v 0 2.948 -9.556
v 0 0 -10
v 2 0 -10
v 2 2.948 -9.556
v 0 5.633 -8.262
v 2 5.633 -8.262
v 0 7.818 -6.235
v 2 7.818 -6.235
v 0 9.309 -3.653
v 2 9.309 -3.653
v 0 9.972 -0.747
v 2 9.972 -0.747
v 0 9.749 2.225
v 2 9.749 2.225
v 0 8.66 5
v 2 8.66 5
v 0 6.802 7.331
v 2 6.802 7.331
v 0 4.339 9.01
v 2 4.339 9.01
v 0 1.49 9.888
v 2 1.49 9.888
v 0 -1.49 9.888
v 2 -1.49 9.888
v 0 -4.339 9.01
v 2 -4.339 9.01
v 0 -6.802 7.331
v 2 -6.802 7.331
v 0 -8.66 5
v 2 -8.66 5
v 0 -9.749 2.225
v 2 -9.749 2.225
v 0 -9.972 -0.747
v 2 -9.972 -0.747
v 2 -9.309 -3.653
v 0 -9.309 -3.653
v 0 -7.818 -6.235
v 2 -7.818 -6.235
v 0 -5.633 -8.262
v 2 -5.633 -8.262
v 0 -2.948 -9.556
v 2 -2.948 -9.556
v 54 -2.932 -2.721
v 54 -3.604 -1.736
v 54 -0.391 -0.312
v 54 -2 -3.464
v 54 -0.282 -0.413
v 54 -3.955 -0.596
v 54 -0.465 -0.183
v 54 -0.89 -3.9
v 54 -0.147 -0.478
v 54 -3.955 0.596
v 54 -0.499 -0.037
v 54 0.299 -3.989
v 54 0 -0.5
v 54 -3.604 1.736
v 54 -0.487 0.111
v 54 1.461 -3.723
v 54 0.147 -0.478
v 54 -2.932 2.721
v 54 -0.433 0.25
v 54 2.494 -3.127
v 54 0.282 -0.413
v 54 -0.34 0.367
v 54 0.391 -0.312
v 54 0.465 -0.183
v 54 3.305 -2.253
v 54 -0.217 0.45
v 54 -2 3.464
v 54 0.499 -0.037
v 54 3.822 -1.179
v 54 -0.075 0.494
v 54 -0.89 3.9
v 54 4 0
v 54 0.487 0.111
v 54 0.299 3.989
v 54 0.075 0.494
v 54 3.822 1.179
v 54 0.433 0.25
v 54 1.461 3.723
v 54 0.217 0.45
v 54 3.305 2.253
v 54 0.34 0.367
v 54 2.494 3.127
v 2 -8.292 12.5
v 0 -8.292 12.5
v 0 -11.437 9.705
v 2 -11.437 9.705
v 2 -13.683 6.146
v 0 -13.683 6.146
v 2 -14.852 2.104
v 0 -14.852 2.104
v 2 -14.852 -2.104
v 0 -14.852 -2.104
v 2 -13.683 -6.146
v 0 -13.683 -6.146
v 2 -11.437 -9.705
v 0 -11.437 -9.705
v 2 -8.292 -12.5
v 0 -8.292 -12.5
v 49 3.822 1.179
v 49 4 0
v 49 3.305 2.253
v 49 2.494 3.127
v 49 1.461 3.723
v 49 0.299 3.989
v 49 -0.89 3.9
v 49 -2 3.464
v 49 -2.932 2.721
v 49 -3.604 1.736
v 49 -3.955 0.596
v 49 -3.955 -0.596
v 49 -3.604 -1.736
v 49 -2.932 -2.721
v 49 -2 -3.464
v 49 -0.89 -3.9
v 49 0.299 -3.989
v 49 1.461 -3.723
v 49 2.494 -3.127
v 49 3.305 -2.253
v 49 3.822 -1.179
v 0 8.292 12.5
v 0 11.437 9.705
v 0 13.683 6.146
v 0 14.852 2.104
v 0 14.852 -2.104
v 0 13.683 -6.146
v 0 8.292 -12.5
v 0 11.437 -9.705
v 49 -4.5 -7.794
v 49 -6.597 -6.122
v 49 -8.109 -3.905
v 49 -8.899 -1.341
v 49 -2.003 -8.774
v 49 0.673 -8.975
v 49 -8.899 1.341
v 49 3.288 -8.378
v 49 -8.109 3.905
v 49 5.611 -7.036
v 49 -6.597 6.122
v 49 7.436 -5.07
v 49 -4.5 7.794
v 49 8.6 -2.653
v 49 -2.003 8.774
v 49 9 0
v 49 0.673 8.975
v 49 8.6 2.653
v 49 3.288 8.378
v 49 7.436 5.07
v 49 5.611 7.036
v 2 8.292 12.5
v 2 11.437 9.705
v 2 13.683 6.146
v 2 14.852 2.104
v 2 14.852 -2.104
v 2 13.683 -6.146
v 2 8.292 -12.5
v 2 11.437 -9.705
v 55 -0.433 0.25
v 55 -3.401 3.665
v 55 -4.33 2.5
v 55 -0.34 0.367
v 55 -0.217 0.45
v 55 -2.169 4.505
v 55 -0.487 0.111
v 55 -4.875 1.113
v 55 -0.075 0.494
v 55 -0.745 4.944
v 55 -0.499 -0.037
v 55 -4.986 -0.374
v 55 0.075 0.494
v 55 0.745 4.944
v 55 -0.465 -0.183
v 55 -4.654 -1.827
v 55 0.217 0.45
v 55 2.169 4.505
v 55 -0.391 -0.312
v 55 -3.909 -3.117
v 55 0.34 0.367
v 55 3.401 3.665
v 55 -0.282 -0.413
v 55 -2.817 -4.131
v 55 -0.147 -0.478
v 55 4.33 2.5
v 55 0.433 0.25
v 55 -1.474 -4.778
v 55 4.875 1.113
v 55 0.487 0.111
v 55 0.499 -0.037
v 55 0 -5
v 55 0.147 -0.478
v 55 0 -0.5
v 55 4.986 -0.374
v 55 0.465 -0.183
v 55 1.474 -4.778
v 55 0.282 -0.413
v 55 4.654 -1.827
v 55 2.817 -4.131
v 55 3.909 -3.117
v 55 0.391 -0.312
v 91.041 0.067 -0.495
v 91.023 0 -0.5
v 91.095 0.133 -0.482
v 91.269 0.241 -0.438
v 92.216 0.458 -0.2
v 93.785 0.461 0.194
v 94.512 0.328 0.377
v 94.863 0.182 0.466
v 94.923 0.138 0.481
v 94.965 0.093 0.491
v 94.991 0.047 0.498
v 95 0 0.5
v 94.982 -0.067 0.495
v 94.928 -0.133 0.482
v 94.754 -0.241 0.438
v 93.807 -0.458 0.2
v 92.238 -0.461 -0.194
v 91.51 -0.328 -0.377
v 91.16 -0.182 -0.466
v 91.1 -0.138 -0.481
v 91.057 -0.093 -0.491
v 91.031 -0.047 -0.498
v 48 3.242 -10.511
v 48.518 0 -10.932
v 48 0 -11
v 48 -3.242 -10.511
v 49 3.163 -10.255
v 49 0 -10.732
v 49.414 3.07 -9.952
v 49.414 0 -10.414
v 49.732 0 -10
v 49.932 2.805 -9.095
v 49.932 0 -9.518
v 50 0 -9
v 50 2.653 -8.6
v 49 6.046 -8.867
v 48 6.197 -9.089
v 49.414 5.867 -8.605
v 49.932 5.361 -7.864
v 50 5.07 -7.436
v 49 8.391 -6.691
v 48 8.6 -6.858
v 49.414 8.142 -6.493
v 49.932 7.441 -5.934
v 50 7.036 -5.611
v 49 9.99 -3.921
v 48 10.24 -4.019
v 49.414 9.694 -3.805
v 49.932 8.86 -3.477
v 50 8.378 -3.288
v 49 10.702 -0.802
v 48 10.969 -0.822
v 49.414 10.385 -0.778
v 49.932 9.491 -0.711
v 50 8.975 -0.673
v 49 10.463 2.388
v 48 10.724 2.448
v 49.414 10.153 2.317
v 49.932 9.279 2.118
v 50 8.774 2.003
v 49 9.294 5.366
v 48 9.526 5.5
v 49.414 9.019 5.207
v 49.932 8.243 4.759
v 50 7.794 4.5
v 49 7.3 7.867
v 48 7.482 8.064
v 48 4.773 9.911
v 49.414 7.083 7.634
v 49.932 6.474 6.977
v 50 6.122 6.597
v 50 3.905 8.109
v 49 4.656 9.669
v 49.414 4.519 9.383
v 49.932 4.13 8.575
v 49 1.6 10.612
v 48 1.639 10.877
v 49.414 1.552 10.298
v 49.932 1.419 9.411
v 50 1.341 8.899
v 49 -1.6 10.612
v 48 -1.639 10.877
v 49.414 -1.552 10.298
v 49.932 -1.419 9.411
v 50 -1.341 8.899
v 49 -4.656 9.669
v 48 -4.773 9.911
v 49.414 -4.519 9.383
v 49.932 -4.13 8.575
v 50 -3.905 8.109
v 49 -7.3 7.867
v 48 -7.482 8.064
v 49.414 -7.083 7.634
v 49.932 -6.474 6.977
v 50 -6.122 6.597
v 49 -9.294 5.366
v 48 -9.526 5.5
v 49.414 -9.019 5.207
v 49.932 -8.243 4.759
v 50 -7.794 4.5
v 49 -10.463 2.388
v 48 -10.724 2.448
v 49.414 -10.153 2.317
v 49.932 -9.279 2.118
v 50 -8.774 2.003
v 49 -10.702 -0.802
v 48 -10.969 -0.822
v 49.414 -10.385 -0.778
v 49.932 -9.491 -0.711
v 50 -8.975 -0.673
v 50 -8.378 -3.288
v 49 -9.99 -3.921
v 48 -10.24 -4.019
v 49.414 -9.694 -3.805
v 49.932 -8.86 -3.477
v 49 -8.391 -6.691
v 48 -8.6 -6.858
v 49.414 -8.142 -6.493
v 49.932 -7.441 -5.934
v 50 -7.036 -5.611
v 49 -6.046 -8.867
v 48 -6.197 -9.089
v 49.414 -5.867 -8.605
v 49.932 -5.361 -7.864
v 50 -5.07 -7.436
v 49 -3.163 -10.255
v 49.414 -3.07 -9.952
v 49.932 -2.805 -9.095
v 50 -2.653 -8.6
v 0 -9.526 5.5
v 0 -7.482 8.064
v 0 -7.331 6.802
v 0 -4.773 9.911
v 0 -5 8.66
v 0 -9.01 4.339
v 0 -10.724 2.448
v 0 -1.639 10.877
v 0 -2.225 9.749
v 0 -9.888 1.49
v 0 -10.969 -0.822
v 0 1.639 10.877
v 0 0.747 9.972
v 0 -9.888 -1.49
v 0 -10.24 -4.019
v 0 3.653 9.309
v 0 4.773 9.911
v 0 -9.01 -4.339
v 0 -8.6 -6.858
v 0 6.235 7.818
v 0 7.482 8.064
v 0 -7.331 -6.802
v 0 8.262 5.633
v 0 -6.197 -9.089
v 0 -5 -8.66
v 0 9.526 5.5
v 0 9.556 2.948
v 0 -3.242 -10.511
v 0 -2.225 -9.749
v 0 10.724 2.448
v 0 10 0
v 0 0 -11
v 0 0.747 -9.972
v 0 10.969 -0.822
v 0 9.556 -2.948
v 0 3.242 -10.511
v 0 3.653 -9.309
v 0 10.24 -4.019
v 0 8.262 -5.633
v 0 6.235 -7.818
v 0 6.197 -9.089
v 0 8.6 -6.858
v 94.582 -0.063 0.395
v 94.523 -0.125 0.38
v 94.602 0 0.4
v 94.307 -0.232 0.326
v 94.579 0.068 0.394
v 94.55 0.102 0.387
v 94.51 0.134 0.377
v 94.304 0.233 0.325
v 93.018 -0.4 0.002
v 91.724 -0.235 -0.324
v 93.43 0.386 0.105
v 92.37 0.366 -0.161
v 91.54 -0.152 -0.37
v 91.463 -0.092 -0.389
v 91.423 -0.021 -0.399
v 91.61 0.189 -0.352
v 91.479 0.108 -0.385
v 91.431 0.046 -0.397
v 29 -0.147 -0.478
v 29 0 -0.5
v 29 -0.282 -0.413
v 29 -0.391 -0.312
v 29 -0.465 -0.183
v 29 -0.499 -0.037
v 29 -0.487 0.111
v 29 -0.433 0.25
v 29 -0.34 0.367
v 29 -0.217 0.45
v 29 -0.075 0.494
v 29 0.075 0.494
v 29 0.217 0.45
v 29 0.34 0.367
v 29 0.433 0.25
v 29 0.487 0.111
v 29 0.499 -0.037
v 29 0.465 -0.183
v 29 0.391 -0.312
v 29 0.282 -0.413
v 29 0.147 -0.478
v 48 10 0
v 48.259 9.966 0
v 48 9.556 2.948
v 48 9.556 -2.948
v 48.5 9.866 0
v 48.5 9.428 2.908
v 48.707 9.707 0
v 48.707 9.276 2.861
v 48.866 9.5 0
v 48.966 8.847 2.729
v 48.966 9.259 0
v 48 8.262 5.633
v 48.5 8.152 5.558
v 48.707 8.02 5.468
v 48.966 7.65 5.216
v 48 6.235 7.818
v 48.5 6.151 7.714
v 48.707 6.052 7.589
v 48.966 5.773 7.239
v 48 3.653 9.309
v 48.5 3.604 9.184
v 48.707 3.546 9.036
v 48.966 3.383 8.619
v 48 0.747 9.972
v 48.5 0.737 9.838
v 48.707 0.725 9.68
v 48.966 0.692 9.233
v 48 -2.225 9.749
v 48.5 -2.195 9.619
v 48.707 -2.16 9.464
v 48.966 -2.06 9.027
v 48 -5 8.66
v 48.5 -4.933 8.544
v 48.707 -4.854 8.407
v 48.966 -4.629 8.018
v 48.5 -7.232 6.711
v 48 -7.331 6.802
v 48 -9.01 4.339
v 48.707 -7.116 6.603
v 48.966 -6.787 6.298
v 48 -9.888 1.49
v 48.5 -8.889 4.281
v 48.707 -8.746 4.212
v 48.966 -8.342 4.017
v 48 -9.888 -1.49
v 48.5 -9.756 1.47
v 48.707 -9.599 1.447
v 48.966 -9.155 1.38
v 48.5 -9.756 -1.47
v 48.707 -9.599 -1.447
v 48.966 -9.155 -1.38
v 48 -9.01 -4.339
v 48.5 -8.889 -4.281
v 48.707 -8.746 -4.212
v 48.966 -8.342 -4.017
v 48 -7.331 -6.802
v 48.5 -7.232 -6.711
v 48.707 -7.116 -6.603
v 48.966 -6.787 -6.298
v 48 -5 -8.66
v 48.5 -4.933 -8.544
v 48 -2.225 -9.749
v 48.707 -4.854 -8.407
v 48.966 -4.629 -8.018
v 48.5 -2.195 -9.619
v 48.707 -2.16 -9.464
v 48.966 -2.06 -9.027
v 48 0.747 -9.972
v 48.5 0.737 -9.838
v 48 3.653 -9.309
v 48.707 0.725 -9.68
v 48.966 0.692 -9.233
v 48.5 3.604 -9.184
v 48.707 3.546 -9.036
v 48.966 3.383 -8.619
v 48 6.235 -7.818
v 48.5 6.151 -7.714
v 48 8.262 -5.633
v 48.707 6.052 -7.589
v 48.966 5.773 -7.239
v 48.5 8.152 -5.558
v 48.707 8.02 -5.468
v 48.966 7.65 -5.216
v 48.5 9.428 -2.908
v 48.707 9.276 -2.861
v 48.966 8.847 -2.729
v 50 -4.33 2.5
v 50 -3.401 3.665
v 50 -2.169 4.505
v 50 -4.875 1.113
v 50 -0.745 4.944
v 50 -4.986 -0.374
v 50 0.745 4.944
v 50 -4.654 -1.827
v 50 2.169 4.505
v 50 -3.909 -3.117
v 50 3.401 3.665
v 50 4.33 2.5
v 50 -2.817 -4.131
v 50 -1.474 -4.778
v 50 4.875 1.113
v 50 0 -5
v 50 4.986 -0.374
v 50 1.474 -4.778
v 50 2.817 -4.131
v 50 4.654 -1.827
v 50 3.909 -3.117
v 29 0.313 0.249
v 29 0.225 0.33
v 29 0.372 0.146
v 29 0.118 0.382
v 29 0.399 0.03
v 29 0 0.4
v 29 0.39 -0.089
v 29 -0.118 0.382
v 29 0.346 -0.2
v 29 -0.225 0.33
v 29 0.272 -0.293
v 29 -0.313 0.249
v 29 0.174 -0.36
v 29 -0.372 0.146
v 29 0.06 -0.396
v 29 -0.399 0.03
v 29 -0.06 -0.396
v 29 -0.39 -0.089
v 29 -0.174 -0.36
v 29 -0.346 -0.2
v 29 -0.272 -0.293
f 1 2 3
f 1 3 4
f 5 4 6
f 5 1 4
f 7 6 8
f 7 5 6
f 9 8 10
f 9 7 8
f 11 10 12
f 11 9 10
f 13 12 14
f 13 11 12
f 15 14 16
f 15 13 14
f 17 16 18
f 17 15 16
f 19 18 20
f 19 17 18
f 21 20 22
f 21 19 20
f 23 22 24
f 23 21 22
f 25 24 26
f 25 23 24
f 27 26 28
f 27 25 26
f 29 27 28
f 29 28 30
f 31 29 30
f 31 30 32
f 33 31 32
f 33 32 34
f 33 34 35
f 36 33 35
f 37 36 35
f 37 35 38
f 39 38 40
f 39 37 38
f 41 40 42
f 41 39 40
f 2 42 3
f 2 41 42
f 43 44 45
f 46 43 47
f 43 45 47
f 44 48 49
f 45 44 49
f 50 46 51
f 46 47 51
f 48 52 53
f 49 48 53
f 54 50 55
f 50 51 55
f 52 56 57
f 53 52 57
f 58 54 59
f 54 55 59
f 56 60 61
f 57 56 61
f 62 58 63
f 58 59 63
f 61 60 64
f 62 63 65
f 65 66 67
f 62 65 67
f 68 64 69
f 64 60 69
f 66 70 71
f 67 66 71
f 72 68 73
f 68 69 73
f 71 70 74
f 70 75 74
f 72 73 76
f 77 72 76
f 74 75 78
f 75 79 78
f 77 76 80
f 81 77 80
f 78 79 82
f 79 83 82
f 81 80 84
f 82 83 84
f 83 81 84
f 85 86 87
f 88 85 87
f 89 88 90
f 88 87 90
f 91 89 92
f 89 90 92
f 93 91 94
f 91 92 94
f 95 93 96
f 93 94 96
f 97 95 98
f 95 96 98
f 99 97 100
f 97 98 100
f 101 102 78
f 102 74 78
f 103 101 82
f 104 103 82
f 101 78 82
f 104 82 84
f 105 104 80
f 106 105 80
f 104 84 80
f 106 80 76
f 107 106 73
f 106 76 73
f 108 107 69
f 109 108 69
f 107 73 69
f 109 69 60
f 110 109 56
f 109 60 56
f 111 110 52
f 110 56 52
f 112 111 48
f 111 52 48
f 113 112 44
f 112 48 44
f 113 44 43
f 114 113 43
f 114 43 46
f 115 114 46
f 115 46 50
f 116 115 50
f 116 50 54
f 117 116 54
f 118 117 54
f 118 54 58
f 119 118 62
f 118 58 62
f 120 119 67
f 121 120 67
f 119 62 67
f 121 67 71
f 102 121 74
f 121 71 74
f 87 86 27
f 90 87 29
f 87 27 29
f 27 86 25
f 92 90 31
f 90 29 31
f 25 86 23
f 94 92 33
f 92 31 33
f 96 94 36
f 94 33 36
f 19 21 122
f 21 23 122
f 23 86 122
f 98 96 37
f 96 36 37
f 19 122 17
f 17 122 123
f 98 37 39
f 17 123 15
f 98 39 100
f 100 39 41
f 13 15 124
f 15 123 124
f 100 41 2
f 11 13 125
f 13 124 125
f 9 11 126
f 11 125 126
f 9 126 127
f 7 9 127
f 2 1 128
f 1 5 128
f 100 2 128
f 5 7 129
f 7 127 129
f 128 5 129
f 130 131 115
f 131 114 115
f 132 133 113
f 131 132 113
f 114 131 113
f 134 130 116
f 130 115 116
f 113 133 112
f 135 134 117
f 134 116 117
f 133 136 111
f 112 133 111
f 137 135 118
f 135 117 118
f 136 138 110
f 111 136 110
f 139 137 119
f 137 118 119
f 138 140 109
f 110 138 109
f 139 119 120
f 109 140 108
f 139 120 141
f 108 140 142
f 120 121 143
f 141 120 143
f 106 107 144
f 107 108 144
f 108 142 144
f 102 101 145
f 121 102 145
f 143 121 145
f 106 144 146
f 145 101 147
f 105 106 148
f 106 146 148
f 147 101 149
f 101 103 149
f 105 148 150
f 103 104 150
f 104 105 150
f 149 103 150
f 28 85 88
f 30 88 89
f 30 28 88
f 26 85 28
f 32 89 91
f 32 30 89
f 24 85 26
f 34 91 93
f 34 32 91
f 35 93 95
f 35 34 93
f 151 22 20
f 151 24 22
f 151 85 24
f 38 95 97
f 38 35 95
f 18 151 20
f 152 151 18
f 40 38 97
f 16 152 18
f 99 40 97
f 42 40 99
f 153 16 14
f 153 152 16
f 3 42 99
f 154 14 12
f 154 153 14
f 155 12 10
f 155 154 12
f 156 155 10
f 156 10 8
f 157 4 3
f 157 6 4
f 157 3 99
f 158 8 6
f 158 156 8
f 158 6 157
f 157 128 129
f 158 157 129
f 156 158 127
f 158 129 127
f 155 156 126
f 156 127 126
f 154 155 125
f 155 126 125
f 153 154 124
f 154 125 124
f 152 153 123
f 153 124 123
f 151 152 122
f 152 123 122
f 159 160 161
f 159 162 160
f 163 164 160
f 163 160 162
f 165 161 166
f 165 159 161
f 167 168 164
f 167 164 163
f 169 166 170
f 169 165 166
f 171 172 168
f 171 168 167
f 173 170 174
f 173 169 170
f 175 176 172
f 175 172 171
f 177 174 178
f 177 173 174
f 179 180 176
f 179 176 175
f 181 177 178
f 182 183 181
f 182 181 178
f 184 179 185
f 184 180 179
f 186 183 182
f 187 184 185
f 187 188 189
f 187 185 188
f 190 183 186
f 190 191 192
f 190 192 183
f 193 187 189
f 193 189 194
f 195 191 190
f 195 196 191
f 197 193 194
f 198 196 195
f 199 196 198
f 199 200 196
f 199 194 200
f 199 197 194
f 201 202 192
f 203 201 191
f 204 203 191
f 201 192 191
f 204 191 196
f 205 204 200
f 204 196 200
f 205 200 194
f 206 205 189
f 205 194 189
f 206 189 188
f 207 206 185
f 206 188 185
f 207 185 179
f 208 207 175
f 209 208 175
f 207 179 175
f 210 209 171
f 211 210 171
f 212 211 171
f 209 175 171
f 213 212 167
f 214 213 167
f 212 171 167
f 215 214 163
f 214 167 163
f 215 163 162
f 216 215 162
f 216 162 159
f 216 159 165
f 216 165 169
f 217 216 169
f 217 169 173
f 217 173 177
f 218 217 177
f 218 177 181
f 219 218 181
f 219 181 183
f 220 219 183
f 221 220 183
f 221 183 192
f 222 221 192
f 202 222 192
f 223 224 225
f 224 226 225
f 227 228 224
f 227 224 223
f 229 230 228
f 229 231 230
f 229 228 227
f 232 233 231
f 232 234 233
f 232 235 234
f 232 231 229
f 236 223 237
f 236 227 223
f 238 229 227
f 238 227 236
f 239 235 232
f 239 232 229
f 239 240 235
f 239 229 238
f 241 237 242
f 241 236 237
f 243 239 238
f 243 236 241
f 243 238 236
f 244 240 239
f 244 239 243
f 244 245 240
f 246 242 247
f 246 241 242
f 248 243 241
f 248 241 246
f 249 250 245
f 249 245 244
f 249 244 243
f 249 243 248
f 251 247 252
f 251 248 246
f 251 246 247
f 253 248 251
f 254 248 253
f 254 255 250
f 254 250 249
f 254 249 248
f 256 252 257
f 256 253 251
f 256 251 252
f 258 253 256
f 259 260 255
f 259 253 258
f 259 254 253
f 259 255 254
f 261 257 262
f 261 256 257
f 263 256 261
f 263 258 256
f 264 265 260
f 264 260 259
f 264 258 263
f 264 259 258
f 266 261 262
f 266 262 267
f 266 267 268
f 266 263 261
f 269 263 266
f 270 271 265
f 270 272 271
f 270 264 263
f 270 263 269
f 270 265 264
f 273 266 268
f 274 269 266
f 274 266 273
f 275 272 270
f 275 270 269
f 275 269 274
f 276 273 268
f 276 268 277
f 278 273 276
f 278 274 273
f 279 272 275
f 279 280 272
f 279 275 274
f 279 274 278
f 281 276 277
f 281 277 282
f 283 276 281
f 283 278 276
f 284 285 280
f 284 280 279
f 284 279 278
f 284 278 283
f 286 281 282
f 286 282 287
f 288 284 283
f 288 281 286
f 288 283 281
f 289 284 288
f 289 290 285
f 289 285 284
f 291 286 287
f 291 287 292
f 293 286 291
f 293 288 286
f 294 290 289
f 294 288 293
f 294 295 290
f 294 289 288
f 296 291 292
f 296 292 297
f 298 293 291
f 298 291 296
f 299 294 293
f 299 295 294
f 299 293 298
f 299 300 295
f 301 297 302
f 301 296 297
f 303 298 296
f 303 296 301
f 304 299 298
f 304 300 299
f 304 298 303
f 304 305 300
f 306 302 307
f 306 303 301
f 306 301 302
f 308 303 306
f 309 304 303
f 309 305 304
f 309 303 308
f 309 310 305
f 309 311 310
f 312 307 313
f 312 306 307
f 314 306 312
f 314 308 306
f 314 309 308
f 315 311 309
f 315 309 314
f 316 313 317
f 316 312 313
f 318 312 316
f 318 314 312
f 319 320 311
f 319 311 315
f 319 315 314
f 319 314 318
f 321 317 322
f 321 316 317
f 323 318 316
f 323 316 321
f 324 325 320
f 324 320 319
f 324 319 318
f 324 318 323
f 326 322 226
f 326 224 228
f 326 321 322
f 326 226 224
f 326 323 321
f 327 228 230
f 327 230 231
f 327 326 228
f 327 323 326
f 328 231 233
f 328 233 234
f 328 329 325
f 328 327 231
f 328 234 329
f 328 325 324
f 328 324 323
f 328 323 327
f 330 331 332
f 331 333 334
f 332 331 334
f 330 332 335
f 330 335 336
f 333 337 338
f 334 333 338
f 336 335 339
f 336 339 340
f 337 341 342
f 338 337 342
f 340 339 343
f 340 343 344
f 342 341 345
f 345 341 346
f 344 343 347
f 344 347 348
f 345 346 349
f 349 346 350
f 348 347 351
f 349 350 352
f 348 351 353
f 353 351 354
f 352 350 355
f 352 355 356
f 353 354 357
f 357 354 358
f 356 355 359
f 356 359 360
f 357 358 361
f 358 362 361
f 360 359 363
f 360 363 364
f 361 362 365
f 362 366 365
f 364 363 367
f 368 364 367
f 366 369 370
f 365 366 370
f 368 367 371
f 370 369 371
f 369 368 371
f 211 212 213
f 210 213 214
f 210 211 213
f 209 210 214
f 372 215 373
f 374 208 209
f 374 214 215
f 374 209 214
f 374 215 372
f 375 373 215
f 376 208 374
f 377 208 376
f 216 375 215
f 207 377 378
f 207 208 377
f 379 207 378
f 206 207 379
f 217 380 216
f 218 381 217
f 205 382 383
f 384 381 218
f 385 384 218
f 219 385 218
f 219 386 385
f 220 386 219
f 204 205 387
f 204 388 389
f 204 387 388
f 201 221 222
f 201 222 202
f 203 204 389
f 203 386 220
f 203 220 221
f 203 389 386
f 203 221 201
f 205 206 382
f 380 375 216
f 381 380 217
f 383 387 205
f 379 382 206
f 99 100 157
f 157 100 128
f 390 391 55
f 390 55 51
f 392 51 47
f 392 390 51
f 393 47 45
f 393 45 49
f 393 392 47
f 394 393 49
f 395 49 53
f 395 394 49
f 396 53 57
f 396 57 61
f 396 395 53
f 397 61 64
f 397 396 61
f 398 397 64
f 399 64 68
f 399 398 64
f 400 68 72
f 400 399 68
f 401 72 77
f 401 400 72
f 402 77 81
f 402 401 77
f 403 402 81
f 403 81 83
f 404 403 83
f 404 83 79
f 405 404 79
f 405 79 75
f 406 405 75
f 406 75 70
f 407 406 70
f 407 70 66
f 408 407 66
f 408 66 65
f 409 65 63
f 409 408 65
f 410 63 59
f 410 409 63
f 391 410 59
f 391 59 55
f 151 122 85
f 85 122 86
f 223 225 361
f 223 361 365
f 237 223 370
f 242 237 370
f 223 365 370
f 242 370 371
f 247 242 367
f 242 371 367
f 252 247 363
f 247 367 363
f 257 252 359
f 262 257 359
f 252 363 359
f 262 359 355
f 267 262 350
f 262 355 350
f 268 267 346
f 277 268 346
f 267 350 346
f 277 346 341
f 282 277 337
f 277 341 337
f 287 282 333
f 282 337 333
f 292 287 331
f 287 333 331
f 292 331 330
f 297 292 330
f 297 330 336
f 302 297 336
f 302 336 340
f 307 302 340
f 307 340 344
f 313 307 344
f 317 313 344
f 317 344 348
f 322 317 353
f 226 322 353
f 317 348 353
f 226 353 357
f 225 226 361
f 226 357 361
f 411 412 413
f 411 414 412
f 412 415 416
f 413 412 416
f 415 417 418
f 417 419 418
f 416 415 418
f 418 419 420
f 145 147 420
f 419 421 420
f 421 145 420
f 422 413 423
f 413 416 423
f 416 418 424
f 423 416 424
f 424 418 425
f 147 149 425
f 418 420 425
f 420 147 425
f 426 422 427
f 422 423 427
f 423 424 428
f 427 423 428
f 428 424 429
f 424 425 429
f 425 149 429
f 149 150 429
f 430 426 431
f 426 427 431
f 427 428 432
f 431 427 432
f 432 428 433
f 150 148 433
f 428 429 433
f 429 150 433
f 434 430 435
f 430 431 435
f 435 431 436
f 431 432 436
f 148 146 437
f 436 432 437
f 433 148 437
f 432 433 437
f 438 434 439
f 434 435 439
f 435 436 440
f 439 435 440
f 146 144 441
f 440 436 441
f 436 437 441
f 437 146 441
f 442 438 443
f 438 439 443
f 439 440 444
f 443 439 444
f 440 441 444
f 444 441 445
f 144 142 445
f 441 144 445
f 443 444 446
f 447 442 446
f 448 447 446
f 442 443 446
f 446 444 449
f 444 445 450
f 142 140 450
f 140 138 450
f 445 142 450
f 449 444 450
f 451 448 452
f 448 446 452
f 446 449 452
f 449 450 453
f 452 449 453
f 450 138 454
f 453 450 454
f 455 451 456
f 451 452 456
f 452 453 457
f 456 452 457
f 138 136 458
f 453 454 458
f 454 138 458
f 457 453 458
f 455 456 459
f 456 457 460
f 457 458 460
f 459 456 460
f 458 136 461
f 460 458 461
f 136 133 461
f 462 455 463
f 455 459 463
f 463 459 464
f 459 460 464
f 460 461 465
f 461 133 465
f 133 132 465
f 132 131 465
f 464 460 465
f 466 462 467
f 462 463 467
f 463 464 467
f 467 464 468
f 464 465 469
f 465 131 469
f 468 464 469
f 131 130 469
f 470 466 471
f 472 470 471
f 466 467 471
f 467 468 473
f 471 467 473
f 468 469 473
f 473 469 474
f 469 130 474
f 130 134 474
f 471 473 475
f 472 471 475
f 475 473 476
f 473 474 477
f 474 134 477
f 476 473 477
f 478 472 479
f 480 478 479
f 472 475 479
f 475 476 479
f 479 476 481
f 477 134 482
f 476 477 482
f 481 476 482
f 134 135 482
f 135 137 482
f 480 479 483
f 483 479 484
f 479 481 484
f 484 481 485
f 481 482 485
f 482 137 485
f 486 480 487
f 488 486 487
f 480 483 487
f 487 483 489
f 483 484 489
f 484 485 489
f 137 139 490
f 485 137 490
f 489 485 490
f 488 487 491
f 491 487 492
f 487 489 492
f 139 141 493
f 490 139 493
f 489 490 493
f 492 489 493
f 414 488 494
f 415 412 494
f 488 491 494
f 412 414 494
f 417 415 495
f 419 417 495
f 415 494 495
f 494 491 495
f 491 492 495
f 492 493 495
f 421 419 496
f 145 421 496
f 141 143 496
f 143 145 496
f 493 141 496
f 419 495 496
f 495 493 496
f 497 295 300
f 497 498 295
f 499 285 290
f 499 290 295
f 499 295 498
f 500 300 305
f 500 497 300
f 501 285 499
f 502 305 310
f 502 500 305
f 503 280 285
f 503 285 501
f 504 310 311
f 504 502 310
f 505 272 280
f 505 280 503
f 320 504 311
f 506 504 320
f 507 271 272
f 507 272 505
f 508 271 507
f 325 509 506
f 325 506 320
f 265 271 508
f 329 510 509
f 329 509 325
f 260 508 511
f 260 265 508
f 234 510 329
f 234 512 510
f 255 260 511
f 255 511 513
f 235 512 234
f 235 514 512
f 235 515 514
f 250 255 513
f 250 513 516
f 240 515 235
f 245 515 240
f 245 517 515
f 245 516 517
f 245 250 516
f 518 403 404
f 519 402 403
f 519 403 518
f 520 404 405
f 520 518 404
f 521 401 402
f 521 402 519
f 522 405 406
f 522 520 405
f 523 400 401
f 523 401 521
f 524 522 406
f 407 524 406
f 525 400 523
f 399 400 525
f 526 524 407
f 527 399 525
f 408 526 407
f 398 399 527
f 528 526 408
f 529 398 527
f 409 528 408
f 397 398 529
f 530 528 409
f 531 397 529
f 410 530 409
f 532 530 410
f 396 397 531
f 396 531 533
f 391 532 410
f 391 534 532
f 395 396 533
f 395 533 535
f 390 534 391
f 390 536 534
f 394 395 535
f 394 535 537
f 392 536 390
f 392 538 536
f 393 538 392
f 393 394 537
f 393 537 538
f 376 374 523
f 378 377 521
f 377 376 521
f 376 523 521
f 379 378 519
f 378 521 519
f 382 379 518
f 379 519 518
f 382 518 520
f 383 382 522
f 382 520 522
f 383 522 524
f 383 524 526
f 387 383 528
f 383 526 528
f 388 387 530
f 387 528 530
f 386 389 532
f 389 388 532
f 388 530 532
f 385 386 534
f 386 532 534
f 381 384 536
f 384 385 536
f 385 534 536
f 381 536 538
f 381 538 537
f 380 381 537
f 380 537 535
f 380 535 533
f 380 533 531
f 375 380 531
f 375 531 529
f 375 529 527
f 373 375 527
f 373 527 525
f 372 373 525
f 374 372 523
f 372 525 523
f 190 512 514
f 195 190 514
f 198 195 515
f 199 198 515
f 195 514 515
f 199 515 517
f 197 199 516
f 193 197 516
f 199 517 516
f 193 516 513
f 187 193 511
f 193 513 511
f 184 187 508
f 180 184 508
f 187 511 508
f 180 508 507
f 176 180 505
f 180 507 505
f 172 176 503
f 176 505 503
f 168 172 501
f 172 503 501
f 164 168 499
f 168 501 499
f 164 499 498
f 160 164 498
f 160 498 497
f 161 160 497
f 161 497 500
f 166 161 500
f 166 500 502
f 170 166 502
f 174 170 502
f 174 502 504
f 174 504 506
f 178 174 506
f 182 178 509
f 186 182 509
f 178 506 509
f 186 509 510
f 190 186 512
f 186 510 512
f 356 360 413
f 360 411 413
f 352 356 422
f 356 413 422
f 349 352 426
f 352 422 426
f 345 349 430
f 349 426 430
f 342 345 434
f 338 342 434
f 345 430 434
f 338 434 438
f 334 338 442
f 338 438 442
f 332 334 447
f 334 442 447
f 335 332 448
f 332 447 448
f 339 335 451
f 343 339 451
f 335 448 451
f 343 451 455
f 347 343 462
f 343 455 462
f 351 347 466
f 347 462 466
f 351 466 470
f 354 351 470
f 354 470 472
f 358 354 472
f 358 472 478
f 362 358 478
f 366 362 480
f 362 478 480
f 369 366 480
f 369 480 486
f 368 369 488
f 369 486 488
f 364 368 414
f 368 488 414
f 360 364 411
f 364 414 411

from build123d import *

# Parameters (mm, degrees)
CROQUIS2_R              = 11
SALIENTE_EXTRUIR1_DEPTH = 50
REDONDEO1_R             = 2
CROQUIS4_R              = 5
SALIENTE_EXTRUIR2_DEPTH = 5
CROQUIS5_R              = 0.5
SALIENTE_EXTRUIR3_DEPTH = 40
SALIENTE_EXTRUIR4_START = 25
CROQUIS6_R              = 0.5
SALIENTE_EXTRUIR4_DEPTH = 25
CORTAR_EXTRUIR2_DEPTH   = 12.5
CROQUIS8_R              = 0.4
CORTAR_EXTRUIR3_DEPTH   = 72
CROQUIS9_R              = 10
SALIENTE_EXTRUIR5_DEPTH = 2


# Read off the part's stored shape, not the designer's step: Vaciado1
with BuildPart() as part:
    # Croquis2 → Saliente-Extruir1 (new body)
    with BuildSketch(Plane(origin=(0, 0, 0), x_dir=(0, 0, -1), z_dir=(1, 0, 0))):
        Circle(CROQUIS2_R)
    extrude(amount=SALIENTE_EXTRUIR1_DEPTH)

    # Redondeo1
    redondeo1_edges = [part.edges().sort_by_distance(p)[0] for p in [
        (50, 0, 11),
    ]]
    fillet(redondeo1_edges, radius=REDONDEO1_R)

    # Croquis4 → Saliente-Extruir2 (add)
    with BuildSketch(Plane(origin=(50, 0, 0), x_dir=(0, 0, -1), z_dir=(1, 0, 0))):
        Circle(CROQUIS4_R)
    extrude(amount=SALIENTE_EXTRUIR2_DEPTH)

    # Croquis5 → Saliente-Extruir3 (add)
    with BuildSketch(Plane(origin=(55, 0, 0), x_dir=(0, 0, -1), z_dir=(1, 0, 0))):
        Circle(CROQUIS5_R)
    extrude(amount=SALIENTE_EXTRUIR3_DEPTH)

    # Vaciado1 outline → Vaciado1 (revolve, cut)
    with BuildSketch(Plane.YX):
        with BuildLine():
            Line((10, 0), (10, 48))
            ThreePointArc((10, 48), (9.707106781, 48.707106781), (9, 49))
            Line((9, 49), (4, 49))
            Line((4, 49), (4, 54))
            Line((4, 54), (0, 54))
            Line((0, 54), (0, 0))
            Line((0, 0), (10, 0))
        make_face()
    revolve(axis=Axis((0, 0, 0), (1, 0, 0)), mode=Mode.SUBTRACT)

    # Croquis6 → Saliente-Extruir4 (add)
    with BuildSketch(Plane.ZY.offset(-54).offset(SALIENTE_EXTRUIR4_START)):
        with Locations(Location((0, 0, 0), (0, 0, 180))):
            Circle(CROQUIS6_R)
    extrude(amount=-SALIENTE_EXTRUIR4_DEPTH)

    # Croquis7 → Cortar-Extruir2 (cut, symmetric)
    with BuildSketch(Plane(origin=(0, 0, 0), x_dir=(1, 0, 0), z_dir=(0, 1, 0))):
        Polygon((95, -0.5), (91.022583164, 0.5), (95, 0.5), align=None)
    extrude(amount=CORTAR_EXTRUIR2_DEPTH, both=True, mode=Mode.SUBTRACT)

    # Croquis8 → Cortar-Extruir3 (cut)
    with BuildSketch(Plane.ZY.offset(-29)):
        Circle(CROQUIS8_R)
    extrude(amount=-CORTAR_EXTRUIR3_DEPTH, mode=Mode.SUBTRACT)


with BuildPart() as body_2:
    # Croquis9 → Saliente-Extruir5 (new body)
    with BuildSketch(Plane(origin=(0, 0, 0), x_dir=(0, 0, -1), z_dir=(1, 0, 0))):
        with BuildLine():
            Line((12.5, -8.291561976), (12.5, 8.291561976))
            ThreePointArc((12.5, 8.291561976), (0, 15), (-12.5, 8.291561976))
            Line((-12.5, 8.291561976), (-12.5, -8.291561976))
            ThreePointArc((-12.5, -8.291561976), (0, -15), (12.5, -8.291561976))
        make_face()
        Circle(CROQUIS9_R, mode=Mode.SUBTRACT)
    extrude(amount=SALIENTE_EXTRUIR5_DEPTH)


solid = Compound([part.part, body_2.part])
